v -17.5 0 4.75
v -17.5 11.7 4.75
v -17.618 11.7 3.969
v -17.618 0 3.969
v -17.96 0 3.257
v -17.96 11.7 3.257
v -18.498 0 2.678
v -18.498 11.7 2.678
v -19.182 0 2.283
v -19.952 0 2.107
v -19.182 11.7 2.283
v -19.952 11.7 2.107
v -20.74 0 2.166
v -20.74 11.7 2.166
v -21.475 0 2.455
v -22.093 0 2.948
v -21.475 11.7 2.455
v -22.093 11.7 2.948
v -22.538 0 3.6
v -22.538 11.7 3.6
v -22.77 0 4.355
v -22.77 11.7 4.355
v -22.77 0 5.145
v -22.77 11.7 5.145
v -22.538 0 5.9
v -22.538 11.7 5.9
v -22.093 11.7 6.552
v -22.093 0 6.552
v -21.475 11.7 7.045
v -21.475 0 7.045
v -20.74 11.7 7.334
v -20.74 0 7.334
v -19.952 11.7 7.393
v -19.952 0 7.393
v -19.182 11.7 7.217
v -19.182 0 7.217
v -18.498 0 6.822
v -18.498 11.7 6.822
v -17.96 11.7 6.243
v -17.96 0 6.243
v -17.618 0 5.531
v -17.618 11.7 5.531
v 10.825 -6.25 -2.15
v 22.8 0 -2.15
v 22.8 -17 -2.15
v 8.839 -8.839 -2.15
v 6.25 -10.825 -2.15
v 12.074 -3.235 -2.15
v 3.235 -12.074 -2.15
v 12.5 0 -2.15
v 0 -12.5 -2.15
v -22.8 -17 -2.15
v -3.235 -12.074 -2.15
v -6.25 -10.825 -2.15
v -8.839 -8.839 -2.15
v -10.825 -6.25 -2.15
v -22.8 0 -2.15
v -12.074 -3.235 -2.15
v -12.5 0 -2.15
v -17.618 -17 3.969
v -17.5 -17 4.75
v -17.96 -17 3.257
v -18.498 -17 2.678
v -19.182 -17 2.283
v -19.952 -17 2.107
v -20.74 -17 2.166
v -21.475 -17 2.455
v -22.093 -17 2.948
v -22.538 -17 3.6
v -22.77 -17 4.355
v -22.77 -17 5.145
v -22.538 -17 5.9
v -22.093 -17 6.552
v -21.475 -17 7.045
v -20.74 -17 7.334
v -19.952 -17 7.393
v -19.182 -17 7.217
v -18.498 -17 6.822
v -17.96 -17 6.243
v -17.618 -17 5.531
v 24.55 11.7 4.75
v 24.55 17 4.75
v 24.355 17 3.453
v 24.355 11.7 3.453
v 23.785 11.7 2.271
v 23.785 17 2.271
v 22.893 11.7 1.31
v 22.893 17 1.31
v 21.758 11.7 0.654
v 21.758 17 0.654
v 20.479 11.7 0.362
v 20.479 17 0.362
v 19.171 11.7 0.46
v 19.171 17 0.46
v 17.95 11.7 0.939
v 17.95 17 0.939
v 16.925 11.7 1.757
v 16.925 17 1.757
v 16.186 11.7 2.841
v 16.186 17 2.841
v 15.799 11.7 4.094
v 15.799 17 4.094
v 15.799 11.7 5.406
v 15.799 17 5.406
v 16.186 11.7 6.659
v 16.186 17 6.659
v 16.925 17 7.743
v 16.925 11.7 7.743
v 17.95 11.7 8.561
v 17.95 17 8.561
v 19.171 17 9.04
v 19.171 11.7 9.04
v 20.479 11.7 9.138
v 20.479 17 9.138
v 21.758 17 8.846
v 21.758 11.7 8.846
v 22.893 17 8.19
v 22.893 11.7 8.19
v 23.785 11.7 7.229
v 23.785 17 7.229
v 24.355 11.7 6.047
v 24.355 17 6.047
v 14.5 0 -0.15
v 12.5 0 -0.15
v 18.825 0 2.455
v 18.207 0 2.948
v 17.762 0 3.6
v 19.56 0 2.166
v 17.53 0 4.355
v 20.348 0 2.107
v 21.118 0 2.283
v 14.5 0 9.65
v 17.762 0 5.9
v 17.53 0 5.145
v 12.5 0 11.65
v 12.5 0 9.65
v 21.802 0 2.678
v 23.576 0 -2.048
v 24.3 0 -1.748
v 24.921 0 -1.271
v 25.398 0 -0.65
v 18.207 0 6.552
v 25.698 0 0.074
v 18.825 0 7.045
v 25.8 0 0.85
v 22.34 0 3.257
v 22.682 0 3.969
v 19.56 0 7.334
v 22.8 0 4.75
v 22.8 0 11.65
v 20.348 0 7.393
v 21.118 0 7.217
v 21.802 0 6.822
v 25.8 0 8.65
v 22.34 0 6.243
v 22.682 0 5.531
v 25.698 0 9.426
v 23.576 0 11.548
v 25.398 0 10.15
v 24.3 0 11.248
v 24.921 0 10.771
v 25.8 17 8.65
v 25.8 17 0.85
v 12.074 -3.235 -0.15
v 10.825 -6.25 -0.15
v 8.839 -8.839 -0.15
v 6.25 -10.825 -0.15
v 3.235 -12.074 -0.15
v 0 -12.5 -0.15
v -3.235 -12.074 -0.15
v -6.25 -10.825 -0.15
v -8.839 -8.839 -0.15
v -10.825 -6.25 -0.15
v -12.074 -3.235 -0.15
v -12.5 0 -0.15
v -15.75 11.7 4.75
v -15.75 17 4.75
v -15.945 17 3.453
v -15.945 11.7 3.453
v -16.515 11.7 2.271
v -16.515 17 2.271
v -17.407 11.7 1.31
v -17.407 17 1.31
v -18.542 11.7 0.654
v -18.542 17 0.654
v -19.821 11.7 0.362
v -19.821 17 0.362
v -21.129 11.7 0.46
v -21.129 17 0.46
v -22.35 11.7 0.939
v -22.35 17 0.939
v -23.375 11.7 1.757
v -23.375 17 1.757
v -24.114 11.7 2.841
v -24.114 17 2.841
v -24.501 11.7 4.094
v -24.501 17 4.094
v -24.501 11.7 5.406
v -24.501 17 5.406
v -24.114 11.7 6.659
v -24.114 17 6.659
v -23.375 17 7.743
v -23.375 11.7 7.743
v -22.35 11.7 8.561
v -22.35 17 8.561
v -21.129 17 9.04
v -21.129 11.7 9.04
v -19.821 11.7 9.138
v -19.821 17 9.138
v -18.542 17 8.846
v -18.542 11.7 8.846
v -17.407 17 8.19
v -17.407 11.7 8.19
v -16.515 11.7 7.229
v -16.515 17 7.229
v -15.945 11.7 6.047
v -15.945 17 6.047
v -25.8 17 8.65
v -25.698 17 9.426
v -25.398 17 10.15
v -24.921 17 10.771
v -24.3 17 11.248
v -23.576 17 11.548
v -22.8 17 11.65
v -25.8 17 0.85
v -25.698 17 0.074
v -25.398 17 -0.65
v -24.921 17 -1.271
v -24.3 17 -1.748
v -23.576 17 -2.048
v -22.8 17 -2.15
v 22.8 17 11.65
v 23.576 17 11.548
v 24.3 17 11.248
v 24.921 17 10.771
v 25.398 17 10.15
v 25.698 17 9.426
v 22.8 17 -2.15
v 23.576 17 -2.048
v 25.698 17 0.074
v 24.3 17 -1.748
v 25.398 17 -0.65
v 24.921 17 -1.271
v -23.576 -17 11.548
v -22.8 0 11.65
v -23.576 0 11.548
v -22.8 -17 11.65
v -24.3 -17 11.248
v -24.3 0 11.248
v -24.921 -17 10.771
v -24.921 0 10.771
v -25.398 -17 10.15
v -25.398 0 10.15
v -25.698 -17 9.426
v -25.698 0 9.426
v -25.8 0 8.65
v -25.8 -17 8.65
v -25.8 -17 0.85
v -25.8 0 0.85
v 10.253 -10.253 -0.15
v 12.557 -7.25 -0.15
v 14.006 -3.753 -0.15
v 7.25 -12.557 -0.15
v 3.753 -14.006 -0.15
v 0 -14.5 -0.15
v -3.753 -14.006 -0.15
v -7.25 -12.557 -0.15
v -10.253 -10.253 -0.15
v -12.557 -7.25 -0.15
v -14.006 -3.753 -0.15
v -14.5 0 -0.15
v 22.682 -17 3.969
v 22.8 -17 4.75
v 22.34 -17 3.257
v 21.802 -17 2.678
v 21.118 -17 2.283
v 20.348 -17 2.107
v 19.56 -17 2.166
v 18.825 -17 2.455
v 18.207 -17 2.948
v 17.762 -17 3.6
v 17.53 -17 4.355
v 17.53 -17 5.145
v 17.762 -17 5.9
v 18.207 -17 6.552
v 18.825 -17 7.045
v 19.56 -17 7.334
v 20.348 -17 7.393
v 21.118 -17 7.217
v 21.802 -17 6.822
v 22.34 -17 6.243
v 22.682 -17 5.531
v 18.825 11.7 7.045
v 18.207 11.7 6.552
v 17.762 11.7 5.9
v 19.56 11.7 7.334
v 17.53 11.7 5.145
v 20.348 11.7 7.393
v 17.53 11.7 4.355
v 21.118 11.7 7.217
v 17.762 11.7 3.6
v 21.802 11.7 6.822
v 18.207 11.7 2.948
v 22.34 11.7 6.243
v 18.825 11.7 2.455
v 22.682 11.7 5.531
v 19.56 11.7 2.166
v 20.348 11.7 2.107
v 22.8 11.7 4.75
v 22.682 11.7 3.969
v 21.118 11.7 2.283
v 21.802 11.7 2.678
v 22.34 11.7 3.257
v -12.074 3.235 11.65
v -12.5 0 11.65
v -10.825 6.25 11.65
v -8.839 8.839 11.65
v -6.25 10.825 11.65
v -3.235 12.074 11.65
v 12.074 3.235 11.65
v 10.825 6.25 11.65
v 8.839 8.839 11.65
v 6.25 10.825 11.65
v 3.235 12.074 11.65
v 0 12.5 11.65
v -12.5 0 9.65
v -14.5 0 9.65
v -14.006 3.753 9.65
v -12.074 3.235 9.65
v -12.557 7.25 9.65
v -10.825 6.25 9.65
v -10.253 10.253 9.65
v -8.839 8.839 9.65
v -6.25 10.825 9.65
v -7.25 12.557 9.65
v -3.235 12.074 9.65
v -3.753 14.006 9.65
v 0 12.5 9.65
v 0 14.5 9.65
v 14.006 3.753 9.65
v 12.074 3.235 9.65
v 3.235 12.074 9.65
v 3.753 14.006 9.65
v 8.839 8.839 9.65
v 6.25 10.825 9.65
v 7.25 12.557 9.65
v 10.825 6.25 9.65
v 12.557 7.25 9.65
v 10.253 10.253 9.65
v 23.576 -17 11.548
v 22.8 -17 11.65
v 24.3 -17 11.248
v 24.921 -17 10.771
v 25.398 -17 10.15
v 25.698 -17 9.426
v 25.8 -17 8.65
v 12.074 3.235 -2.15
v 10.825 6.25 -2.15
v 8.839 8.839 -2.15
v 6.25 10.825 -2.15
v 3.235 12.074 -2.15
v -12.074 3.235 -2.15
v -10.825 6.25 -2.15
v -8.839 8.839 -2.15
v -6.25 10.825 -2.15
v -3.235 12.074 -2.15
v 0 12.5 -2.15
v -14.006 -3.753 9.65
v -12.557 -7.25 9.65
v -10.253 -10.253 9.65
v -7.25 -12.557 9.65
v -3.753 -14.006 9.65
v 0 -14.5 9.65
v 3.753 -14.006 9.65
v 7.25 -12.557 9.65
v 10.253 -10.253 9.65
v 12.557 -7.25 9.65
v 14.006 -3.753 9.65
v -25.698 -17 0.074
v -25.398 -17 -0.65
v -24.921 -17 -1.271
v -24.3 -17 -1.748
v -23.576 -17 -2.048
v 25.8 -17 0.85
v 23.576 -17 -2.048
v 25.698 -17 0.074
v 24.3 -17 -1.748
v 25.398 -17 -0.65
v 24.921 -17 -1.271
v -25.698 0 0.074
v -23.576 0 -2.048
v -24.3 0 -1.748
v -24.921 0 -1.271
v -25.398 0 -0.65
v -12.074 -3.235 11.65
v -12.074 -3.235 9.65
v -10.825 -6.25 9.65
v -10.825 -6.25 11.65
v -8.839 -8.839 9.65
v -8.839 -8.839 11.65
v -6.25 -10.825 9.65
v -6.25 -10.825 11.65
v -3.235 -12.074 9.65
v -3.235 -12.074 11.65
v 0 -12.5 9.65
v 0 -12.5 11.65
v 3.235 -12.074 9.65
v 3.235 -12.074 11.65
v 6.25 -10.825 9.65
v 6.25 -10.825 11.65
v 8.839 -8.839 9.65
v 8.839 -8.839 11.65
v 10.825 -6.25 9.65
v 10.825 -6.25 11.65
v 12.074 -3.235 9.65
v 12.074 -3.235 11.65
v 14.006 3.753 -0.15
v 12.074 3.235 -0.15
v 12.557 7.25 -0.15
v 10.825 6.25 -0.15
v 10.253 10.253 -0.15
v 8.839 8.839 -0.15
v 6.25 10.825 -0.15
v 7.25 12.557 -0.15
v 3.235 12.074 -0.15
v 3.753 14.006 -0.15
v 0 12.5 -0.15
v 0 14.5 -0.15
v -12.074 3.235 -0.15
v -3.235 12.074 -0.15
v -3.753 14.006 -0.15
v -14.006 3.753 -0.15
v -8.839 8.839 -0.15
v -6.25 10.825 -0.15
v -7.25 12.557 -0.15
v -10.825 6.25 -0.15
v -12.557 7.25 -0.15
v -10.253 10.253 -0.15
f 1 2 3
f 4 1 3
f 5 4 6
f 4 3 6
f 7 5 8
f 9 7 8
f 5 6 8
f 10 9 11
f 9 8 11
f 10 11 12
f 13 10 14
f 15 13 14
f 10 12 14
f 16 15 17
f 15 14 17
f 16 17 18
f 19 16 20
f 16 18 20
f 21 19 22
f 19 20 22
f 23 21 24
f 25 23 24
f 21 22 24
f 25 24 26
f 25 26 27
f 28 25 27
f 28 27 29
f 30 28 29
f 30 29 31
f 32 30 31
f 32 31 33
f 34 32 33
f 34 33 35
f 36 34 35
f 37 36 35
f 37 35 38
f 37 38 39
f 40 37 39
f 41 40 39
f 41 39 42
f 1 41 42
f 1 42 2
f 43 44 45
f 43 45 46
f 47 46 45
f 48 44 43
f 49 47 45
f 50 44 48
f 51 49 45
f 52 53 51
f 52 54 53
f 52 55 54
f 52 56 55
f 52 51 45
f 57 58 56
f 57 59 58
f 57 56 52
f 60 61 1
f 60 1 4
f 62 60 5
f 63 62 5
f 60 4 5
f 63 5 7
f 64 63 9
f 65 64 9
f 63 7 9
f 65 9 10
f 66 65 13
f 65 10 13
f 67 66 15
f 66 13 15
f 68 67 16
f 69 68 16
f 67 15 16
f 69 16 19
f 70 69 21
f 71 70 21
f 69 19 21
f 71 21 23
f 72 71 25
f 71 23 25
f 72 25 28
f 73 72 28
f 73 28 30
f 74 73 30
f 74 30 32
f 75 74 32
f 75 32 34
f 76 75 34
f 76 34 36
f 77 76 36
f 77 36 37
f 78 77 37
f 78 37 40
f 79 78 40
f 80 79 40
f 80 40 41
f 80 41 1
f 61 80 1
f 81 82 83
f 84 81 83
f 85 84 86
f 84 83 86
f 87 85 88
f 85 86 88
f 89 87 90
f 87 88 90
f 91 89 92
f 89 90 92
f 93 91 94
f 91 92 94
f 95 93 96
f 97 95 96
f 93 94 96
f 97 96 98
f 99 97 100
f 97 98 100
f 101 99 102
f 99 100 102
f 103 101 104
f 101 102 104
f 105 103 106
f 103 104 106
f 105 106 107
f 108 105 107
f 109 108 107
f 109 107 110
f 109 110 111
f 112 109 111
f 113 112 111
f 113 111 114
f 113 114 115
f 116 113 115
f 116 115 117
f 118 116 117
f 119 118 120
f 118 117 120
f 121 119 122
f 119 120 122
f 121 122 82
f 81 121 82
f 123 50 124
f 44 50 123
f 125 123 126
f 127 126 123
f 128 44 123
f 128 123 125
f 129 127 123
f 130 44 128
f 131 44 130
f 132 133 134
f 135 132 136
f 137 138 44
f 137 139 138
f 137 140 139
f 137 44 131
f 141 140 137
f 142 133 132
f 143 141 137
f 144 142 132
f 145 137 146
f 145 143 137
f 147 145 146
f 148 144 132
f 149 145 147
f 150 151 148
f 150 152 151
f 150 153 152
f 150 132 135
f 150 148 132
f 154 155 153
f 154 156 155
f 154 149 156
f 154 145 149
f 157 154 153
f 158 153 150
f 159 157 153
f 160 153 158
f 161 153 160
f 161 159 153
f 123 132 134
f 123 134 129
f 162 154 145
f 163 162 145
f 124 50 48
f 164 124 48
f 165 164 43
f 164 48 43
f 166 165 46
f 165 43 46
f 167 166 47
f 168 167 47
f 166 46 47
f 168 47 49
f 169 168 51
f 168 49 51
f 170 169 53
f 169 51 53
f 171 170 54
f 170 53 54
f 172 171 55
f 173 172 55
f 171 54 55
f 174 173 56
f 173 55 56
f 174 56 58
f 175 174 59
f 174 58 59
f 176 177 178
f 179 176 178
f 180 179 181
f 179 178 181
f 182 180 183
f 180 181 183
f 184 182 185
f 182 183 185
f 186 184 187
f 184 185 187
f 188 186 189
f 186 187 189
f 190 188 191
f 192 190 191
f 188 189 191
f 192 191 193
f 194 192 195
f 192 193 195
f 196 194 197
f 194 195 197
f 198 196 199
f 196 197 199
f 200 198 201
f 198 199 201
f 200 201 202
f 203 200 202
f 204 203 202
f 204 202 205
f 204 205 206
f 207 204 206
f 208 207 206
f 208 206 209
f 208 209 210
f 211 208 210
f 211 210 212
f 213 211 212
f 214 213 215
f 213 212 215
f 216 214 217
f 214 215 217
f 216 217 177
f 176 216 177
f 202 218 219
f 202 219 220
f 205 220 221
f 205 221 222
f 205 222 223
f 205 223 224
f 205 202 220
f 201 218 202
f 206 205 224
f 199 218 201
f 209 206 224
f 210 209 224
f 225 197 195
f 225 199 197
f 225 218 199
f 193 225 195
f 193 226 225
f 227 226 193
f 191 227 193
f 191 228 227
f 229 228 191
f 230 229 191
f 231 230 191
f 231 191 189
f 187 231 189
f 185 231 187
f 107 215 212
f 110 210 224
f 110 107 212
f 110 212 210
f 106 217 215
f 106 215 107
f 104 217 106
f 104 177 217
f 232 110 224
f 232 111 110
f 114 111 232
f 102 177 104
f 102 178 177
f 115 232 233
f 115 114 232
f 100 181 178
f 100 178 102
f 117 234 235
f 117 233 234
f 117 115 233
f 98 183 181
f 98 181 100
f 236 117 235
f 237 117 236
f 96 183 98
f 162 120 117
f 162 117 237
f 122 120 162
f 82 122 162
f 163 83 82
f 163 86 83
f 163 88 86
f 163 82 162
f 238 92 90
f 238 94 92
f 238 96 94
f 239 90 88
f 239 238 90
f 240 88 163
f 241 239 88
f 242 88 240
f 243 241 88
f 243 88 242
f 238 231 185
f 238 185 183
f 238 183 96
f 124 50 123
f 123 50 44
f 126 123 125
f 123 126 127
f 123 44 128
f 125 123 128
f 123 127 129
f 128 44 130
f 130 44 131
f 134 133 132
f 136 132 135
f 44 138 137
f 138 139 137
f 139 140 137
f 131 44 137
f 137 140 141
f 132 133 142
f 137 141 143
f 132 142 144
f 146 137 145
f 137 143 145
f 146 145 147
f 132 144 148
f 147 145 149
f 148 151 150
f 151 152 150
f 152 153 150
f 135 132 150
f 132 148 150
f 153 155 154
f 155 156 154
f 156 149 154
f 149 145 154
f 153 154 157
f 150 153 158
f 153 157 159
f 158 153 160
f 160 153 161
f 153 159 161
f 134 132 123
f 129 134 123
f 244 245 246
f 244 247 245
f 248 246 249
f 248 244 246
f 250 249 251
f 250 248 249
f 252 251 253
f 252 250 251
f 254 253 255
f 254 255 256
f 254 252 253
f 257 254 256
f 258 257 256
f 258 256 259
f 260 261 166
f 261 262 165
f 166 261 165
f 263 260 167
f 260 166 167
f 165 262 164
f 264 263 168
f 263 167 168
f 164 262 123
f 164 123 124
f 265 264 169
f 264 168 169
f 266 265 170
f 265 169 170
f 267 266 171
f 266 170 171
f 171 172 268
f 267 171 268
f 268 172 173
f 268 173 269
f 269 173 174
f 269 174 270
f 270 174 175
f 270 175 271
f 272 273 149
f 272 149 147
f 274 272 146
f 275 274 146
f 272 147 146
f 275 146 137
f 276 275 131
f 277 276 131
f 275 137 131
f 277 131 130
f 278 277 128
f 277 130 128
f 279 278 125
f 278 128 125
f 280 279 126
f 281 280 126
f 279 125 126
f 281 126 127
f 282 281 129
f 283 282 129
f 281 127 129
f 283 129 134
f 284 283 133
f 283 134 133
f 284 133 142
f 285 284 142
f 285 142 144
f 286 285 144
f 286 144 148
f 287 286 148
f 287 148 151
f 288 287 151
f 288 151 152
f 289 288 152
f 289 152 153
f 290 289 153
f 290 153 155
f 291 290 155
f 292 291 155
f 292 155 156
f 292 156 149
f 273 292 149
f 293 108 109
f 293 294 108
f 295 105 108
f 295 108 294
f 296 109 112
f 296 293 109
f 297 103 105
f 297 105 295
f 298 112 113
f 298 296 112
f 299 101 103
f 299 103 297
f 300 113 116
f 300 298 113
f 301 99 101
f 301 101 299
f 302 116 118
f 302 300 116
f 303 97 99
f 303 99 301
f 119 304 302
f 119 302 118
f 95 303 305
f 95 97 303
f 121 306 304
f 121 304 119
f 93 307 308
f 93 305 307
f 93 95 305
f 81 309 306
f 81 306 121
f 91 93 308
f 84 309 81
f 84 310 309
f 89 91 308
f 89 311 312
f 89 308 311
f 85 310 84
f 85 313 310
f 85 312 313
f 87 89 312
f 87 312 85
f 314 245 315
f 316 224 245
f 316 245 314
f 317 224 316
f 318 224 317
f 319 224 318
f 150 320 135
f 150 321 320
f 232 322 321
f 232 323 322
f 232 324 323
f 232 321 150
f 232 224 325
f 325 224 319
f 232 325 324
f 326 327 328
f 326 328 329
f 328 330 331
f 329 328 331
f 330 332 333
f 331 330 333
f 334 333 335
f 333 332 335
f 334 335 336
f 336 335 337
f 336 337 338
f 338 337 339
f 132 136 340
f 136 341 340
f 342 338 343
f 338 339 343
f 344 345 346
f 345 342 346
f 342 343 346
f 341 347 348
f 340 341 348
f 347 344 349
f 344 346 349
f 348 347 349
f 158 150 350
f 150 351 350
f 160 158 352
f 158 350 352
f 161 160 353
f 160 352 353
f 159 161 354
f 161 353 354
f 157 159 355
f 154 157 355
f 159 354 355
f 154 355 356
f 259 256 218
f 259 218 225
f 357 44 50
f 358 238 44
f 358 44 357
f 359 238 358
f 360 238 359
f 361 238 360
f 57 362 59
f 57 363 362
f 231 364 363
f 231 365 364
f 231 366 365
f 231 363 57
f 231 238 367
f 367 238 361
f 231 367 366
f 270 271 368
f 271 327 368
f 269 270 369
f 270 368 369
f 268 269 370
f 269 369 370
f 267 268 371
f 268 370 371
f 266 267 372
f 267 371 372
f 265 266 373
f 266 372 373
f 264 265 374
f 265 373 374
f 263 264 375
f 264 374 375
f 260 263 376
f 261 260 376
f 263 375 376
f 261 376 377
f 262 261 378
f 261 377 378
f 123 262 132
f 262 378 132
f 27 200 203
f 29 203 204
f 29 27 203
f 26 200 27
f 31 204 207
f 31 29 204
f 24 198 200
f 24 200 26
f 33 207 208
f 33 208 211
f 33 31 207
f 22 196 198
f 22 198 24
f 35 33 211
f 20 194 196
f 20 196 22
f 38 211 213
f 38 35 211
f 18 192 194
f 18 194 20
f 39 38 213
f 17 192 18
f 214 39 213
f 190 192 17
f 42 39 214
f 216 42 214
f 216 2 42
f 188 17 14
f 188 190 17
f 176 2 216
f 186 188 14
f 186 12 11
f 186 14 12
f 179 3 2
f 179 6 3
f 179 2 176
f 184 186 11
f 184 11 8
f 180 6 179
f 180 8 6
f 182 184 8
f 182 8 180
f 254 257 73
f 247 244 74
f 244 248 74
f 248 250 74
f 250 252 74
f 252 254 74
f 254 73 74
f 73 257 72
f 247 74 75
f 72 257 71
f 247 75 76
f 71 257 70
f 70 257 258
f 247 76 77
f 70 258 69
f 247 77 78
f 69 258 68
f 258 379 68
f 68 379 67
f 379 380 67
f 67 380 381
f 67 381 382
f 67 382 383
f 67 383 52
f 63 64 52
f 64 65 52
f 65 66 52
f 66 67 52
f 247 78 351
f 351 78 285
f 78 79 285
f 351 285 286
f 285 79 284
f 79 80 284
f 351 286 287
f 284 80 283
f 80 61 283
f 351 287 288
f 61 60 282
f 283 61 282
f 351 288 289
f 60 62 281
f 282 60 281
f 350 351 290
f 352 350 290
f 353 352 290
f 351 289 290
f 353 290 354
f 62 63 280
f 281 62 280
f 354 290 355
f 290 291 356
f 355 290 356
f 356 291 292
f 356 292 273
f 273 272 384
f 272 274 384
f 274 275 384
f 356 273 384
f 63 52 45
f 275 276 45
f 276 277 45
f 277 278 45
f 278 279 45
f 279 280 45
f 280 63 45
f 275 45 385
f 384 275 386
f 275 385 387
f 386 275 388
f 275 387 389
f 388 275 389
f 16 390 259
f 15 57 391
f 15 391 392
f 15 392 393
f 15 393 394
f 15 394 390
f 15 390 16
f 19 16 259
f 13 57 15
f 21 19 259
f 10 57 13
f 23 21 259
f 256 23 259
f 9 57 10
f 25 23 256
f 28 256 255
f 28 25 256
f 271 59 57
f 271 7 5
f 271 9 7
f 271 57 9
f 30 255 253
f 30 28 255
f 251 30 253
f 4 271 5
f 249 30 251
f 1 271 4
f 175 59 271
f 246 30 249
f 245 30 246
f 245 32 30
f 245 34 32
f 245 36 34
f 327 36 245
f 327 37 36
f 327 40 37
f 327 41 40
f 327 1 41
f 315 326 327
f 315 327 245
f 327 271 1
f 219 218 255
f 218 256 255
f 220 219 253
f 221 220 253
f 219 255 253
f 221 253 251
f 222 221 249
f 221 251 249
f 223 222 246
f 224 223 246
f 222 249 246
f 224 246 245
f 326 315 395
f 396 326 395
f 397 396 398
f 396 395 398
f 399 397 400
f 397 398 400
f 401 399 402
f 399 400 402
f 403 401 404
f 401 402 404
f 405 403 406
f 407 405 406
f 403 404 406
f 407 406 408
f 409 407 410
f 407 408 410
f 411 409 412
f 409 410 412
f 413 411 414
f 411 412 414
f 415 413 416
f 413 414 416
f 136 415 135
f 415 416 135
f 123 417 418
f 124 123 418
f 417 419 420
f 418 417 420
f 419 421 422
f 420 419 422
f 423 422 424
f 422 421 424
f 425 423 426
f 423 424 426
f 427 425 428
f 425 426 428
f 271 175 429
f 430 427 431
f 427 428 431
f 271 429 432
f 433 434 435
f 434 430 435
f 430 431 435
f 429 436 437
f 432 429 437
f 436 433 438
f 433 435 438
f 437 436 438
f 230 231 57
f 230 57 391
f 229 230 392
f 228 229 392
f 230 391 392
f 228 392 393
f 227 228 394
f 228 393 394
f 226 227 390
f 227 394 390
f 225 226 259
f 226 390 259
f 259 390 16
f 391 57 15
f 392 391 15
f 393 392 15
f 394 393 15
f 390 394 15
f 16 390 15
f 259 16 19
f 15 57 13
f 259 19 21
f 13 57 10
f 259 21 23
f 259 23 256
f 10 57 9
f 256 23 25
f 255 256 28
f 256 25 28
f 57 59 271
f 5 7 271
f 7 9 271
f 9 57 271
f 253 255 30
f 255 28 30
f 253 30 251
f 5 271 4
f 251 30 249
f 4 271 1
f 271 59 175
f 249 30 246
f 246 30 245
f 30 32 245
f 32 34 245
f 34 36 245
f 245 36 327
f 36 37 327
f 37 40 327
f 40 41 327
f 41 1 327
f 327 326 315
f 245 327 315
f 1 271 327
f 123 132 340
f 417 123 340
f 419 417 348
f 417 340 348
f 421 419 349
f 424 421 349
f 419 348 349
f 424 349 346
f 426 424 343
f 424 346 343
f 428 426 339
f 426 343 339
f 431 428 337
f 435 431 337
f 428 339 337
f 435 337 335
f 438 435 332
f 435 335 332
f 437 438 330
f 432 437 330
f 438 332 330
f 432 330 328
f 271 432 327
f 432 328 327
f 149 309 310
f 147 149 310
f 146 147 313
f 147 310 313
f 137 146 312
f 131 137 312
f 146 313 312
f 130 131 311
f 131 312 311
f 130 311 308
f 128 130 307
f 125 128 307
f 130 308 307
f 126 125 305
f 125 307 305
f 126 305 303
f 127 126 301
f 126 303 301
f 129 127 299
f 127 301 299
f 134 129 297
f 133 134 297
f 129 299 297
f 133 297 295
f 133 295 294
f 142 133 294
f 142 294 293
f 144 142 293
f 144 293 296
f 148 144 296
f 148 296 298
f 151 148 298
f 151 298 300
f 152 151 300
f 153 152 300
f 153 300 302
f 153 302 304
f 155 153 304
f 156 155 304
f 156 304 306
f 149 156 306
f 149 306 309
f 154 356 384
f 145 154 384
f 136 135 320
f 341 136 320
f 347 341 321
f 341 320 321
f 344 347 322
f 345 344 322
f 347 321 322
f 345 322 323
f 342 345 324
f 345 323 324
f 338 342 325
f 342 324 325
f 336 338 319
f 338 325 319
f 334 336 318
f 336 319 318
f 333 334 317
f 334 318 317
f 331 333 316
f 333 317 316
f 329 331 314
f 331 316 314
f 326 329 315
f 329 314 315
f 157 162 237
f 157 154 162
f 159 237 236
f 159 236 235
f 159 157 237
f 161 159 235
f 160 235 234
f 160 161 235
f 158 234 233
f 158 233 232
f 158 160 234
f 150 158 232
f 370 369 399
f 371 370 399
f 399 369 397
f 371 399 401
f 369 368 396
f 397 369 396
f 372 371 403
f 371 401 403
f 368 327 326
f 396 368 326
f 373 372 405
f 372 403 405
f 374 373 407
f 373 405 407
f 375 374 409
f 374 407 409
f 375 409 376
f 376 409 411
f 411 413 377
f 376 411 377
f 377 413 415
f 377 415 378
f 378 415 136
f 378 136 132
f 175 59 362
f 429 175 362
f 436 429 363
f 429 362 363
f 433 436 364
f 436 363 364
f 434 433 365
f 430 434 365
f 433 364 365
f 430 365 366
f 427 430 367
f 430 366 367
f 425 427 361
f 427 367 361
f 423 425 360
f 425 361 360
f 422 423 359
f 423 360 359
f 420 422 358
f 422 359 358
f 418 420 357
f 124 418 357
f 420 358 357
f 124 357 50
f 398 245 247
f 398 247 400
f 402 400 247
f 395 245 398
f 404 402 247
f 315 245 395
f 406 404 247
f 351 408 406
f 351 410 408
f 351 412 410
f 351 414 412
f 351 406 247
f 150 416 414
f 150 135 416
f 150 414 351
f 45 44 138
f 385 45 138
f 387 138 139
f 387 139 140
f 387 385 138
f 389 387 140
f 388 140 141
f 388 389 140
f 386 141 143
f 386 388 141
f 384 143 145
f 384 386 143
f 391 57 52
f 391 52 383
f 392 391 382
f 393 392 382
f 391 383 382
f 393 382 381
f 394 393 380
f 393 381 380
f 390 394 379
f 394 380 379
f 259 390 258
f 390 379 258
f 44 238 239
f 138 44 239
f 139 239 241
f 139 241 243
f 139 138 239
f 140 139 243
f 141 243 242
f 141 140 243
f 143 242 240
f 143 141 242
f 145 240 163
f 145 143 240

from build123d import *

# Parameters (mm, degrees)
SKETCH1_R               = 14.5
BOSS_EXTRUDE1_DEPTH     = 9.5
BOSS_EXTRUDE2_START     = 17
SKETCH2_W               = 51.6
SKETCH2_H               = 13.8
SKETCH2_R               = 2.65
BOSS_EXTRUDE2_DEPTH     = 34
SKETCH5_R               = 14.5
CUT_EXTRUDE2_DEPTH      = 1
CUT_EXTRUDE2_DEPTH_BACK = 14.8
SKETCH6_R               = 14.5
SKETCH6_R_2             = 12.5
BOSS_EXTRUDE4_DEPTH     = 2
SKETCH7_R               = 14.5
SKETCH7_R_2             = 12.5
BOSS_EXTRUDE5_DEPTH     = 2
SKETCH8_R               = 4.4
CUT_EXTRUDE3_DEPTH      = 1
CUT_EXTRUDE3_DEPTH_BACK = 5.3
FILLET1_R               = 3
FILLET2_R               = 3


with BuildPart() as part:
    # Sketch1 → Boss-Extrude1 (new body)
    with BuildSketch(Plane.XY):
        Circle(SKETCH1_R)
    extrude(amount=BOSS_EXTRUDE1_DEPTH)


with BuildPart() as body_2:
    # Sketch2 → Boss-Extrude2 (new body)
    with BuildSketch(Plane(origin=(0, 0, 0), x_dir=(1, 0, 0), z_dir=(0, 1, 0)).offset(BOSS_EXTRUDE2_START)):
        with Locations((0, -4.75)):
            Rectangle(SKETCH2_W, SKETCH2_H)
        with Locations((-20.15, -4.75)):
            Circle(SKETCH2_R, mode=Mode.SUBTRACT)
        with Locations((20.15, -4.75)):
            Circle(SKETCH2_R, mode=Mode.SUBTRACT)
    extrude(amount=-BOSS_EXTRUDE2_DEPTH)


with BuildPart() as cut_extrude2_tool:
    # Sketch5 → Cut-Extrude2 (new body, two sides)
    with BuildSketch(Plane.XY.offset(11.65)) as cut_extrude2_sk:
        Circle(SKETCH5_R)
    extrude(amount=CUT_EXTRUDE2_DEPTH)
    extrude(cut_extrude2_sk.sketch, amount=-CUT_EXTRUDE2_DEPTH_BACK)


with BuildPart() as part_1:
    add(part.part)

    # Cut-Extrude2: cut by cut_extrude2_tool
    add(cut_extrude2_tool.part, mode=Mode.SUBTRACT)


with BuildPart() as body_2_1:
    add(body_2.part)

    # Cut-Extrude2: cut by cut_extrude2_tool
    add(cut_extrude2_tool.part, mode=Mode.SUBTRACT)

    # Sketch6 → Boss-Extrude4 (add)
    with BuildSketch(Plane.XY.offset(11.65)):
        Circle(SKETCH6_R)
        Circle(SKETCH6_R_2, mode=Mode.SUBTRACT)
    extrude(amount=-BOSS_EXTRUDE4_DEPTH)

    # Sketch7 → Boss-Extrude5 (add)
    with BuildSketch(Plane(origin=(0, 0, -2.15), x_dir=(-1, 0, 0), z_dir=(0, 0, -1))):
        Circle(SKETCH7_R)
        Circle(SKETCH7_R_2, mode=Mode.SUBTRACT)
    extrude(amount=-BOSS_EXTRUDE5_DEPTH)


with BuildPart() as body_2_2:
    # Split1: the piece on the far side of the plane
    add(body_2_1.part)
    split(bisect_by=Plane.ZX, keep=Keep.BOTTOM)

    # Fillet2
    fillet2_edges = [body_2_2.edges().sort_by_distance(p)[0] for p in [
        (-25.8, -8.5, 11.65),
        (25.8, -8.5, 11.65),
        (25.8, -8.5, -2.15),
        (-25.8, -8.5, -2.15),
    ]]
    fillet(fillet2_edges, radius=FILLET2_R)


with BuildPart() as body_2_3:
    add(body_2_1.part)

    # Split1
    split(bisect_by=Plane.ZX, keep=Keep.TOP)

    # Sketch8 → Cut-Extrude3 (cut, two sides)
    with BuildSketch(Plane(origin=(0, 17, 0), x_dir=(1, 0, 0), z_dir=(0, 1, 0))) as cut_extrude3_sk:
        with Locations((-20.15, -4.75)):
            Circle(SKETCH8_R)
        with Locations((20.15, -4.75)):
            Circle(SKETCH8_R)
    extrude(amount=CUT_EXTRUDE3_DEPTH, mode=Mode.SUBTRACT)
    extrude(cut_extrude3_sk.sketch, amount=-CUT_EXTRUDE3_DEPTH_BACK, mode=Mode.SUBTRACT)

    # Fillet1
    fillet1_edges = [body_2_3.edges().sort_by_distance(p)[0] for p in [
        (-25.8, 8.5, 11.65),
        (25.8, 8.5, 11.65),
        (25.8, 8.5, -2.15),
        (-25.8, 8.5, -2.15),
    ]]
    fillet(fillet1_edges, radius=FILLET1_R)


solid = Compound([body_2_2.part, body_2_3.part])
